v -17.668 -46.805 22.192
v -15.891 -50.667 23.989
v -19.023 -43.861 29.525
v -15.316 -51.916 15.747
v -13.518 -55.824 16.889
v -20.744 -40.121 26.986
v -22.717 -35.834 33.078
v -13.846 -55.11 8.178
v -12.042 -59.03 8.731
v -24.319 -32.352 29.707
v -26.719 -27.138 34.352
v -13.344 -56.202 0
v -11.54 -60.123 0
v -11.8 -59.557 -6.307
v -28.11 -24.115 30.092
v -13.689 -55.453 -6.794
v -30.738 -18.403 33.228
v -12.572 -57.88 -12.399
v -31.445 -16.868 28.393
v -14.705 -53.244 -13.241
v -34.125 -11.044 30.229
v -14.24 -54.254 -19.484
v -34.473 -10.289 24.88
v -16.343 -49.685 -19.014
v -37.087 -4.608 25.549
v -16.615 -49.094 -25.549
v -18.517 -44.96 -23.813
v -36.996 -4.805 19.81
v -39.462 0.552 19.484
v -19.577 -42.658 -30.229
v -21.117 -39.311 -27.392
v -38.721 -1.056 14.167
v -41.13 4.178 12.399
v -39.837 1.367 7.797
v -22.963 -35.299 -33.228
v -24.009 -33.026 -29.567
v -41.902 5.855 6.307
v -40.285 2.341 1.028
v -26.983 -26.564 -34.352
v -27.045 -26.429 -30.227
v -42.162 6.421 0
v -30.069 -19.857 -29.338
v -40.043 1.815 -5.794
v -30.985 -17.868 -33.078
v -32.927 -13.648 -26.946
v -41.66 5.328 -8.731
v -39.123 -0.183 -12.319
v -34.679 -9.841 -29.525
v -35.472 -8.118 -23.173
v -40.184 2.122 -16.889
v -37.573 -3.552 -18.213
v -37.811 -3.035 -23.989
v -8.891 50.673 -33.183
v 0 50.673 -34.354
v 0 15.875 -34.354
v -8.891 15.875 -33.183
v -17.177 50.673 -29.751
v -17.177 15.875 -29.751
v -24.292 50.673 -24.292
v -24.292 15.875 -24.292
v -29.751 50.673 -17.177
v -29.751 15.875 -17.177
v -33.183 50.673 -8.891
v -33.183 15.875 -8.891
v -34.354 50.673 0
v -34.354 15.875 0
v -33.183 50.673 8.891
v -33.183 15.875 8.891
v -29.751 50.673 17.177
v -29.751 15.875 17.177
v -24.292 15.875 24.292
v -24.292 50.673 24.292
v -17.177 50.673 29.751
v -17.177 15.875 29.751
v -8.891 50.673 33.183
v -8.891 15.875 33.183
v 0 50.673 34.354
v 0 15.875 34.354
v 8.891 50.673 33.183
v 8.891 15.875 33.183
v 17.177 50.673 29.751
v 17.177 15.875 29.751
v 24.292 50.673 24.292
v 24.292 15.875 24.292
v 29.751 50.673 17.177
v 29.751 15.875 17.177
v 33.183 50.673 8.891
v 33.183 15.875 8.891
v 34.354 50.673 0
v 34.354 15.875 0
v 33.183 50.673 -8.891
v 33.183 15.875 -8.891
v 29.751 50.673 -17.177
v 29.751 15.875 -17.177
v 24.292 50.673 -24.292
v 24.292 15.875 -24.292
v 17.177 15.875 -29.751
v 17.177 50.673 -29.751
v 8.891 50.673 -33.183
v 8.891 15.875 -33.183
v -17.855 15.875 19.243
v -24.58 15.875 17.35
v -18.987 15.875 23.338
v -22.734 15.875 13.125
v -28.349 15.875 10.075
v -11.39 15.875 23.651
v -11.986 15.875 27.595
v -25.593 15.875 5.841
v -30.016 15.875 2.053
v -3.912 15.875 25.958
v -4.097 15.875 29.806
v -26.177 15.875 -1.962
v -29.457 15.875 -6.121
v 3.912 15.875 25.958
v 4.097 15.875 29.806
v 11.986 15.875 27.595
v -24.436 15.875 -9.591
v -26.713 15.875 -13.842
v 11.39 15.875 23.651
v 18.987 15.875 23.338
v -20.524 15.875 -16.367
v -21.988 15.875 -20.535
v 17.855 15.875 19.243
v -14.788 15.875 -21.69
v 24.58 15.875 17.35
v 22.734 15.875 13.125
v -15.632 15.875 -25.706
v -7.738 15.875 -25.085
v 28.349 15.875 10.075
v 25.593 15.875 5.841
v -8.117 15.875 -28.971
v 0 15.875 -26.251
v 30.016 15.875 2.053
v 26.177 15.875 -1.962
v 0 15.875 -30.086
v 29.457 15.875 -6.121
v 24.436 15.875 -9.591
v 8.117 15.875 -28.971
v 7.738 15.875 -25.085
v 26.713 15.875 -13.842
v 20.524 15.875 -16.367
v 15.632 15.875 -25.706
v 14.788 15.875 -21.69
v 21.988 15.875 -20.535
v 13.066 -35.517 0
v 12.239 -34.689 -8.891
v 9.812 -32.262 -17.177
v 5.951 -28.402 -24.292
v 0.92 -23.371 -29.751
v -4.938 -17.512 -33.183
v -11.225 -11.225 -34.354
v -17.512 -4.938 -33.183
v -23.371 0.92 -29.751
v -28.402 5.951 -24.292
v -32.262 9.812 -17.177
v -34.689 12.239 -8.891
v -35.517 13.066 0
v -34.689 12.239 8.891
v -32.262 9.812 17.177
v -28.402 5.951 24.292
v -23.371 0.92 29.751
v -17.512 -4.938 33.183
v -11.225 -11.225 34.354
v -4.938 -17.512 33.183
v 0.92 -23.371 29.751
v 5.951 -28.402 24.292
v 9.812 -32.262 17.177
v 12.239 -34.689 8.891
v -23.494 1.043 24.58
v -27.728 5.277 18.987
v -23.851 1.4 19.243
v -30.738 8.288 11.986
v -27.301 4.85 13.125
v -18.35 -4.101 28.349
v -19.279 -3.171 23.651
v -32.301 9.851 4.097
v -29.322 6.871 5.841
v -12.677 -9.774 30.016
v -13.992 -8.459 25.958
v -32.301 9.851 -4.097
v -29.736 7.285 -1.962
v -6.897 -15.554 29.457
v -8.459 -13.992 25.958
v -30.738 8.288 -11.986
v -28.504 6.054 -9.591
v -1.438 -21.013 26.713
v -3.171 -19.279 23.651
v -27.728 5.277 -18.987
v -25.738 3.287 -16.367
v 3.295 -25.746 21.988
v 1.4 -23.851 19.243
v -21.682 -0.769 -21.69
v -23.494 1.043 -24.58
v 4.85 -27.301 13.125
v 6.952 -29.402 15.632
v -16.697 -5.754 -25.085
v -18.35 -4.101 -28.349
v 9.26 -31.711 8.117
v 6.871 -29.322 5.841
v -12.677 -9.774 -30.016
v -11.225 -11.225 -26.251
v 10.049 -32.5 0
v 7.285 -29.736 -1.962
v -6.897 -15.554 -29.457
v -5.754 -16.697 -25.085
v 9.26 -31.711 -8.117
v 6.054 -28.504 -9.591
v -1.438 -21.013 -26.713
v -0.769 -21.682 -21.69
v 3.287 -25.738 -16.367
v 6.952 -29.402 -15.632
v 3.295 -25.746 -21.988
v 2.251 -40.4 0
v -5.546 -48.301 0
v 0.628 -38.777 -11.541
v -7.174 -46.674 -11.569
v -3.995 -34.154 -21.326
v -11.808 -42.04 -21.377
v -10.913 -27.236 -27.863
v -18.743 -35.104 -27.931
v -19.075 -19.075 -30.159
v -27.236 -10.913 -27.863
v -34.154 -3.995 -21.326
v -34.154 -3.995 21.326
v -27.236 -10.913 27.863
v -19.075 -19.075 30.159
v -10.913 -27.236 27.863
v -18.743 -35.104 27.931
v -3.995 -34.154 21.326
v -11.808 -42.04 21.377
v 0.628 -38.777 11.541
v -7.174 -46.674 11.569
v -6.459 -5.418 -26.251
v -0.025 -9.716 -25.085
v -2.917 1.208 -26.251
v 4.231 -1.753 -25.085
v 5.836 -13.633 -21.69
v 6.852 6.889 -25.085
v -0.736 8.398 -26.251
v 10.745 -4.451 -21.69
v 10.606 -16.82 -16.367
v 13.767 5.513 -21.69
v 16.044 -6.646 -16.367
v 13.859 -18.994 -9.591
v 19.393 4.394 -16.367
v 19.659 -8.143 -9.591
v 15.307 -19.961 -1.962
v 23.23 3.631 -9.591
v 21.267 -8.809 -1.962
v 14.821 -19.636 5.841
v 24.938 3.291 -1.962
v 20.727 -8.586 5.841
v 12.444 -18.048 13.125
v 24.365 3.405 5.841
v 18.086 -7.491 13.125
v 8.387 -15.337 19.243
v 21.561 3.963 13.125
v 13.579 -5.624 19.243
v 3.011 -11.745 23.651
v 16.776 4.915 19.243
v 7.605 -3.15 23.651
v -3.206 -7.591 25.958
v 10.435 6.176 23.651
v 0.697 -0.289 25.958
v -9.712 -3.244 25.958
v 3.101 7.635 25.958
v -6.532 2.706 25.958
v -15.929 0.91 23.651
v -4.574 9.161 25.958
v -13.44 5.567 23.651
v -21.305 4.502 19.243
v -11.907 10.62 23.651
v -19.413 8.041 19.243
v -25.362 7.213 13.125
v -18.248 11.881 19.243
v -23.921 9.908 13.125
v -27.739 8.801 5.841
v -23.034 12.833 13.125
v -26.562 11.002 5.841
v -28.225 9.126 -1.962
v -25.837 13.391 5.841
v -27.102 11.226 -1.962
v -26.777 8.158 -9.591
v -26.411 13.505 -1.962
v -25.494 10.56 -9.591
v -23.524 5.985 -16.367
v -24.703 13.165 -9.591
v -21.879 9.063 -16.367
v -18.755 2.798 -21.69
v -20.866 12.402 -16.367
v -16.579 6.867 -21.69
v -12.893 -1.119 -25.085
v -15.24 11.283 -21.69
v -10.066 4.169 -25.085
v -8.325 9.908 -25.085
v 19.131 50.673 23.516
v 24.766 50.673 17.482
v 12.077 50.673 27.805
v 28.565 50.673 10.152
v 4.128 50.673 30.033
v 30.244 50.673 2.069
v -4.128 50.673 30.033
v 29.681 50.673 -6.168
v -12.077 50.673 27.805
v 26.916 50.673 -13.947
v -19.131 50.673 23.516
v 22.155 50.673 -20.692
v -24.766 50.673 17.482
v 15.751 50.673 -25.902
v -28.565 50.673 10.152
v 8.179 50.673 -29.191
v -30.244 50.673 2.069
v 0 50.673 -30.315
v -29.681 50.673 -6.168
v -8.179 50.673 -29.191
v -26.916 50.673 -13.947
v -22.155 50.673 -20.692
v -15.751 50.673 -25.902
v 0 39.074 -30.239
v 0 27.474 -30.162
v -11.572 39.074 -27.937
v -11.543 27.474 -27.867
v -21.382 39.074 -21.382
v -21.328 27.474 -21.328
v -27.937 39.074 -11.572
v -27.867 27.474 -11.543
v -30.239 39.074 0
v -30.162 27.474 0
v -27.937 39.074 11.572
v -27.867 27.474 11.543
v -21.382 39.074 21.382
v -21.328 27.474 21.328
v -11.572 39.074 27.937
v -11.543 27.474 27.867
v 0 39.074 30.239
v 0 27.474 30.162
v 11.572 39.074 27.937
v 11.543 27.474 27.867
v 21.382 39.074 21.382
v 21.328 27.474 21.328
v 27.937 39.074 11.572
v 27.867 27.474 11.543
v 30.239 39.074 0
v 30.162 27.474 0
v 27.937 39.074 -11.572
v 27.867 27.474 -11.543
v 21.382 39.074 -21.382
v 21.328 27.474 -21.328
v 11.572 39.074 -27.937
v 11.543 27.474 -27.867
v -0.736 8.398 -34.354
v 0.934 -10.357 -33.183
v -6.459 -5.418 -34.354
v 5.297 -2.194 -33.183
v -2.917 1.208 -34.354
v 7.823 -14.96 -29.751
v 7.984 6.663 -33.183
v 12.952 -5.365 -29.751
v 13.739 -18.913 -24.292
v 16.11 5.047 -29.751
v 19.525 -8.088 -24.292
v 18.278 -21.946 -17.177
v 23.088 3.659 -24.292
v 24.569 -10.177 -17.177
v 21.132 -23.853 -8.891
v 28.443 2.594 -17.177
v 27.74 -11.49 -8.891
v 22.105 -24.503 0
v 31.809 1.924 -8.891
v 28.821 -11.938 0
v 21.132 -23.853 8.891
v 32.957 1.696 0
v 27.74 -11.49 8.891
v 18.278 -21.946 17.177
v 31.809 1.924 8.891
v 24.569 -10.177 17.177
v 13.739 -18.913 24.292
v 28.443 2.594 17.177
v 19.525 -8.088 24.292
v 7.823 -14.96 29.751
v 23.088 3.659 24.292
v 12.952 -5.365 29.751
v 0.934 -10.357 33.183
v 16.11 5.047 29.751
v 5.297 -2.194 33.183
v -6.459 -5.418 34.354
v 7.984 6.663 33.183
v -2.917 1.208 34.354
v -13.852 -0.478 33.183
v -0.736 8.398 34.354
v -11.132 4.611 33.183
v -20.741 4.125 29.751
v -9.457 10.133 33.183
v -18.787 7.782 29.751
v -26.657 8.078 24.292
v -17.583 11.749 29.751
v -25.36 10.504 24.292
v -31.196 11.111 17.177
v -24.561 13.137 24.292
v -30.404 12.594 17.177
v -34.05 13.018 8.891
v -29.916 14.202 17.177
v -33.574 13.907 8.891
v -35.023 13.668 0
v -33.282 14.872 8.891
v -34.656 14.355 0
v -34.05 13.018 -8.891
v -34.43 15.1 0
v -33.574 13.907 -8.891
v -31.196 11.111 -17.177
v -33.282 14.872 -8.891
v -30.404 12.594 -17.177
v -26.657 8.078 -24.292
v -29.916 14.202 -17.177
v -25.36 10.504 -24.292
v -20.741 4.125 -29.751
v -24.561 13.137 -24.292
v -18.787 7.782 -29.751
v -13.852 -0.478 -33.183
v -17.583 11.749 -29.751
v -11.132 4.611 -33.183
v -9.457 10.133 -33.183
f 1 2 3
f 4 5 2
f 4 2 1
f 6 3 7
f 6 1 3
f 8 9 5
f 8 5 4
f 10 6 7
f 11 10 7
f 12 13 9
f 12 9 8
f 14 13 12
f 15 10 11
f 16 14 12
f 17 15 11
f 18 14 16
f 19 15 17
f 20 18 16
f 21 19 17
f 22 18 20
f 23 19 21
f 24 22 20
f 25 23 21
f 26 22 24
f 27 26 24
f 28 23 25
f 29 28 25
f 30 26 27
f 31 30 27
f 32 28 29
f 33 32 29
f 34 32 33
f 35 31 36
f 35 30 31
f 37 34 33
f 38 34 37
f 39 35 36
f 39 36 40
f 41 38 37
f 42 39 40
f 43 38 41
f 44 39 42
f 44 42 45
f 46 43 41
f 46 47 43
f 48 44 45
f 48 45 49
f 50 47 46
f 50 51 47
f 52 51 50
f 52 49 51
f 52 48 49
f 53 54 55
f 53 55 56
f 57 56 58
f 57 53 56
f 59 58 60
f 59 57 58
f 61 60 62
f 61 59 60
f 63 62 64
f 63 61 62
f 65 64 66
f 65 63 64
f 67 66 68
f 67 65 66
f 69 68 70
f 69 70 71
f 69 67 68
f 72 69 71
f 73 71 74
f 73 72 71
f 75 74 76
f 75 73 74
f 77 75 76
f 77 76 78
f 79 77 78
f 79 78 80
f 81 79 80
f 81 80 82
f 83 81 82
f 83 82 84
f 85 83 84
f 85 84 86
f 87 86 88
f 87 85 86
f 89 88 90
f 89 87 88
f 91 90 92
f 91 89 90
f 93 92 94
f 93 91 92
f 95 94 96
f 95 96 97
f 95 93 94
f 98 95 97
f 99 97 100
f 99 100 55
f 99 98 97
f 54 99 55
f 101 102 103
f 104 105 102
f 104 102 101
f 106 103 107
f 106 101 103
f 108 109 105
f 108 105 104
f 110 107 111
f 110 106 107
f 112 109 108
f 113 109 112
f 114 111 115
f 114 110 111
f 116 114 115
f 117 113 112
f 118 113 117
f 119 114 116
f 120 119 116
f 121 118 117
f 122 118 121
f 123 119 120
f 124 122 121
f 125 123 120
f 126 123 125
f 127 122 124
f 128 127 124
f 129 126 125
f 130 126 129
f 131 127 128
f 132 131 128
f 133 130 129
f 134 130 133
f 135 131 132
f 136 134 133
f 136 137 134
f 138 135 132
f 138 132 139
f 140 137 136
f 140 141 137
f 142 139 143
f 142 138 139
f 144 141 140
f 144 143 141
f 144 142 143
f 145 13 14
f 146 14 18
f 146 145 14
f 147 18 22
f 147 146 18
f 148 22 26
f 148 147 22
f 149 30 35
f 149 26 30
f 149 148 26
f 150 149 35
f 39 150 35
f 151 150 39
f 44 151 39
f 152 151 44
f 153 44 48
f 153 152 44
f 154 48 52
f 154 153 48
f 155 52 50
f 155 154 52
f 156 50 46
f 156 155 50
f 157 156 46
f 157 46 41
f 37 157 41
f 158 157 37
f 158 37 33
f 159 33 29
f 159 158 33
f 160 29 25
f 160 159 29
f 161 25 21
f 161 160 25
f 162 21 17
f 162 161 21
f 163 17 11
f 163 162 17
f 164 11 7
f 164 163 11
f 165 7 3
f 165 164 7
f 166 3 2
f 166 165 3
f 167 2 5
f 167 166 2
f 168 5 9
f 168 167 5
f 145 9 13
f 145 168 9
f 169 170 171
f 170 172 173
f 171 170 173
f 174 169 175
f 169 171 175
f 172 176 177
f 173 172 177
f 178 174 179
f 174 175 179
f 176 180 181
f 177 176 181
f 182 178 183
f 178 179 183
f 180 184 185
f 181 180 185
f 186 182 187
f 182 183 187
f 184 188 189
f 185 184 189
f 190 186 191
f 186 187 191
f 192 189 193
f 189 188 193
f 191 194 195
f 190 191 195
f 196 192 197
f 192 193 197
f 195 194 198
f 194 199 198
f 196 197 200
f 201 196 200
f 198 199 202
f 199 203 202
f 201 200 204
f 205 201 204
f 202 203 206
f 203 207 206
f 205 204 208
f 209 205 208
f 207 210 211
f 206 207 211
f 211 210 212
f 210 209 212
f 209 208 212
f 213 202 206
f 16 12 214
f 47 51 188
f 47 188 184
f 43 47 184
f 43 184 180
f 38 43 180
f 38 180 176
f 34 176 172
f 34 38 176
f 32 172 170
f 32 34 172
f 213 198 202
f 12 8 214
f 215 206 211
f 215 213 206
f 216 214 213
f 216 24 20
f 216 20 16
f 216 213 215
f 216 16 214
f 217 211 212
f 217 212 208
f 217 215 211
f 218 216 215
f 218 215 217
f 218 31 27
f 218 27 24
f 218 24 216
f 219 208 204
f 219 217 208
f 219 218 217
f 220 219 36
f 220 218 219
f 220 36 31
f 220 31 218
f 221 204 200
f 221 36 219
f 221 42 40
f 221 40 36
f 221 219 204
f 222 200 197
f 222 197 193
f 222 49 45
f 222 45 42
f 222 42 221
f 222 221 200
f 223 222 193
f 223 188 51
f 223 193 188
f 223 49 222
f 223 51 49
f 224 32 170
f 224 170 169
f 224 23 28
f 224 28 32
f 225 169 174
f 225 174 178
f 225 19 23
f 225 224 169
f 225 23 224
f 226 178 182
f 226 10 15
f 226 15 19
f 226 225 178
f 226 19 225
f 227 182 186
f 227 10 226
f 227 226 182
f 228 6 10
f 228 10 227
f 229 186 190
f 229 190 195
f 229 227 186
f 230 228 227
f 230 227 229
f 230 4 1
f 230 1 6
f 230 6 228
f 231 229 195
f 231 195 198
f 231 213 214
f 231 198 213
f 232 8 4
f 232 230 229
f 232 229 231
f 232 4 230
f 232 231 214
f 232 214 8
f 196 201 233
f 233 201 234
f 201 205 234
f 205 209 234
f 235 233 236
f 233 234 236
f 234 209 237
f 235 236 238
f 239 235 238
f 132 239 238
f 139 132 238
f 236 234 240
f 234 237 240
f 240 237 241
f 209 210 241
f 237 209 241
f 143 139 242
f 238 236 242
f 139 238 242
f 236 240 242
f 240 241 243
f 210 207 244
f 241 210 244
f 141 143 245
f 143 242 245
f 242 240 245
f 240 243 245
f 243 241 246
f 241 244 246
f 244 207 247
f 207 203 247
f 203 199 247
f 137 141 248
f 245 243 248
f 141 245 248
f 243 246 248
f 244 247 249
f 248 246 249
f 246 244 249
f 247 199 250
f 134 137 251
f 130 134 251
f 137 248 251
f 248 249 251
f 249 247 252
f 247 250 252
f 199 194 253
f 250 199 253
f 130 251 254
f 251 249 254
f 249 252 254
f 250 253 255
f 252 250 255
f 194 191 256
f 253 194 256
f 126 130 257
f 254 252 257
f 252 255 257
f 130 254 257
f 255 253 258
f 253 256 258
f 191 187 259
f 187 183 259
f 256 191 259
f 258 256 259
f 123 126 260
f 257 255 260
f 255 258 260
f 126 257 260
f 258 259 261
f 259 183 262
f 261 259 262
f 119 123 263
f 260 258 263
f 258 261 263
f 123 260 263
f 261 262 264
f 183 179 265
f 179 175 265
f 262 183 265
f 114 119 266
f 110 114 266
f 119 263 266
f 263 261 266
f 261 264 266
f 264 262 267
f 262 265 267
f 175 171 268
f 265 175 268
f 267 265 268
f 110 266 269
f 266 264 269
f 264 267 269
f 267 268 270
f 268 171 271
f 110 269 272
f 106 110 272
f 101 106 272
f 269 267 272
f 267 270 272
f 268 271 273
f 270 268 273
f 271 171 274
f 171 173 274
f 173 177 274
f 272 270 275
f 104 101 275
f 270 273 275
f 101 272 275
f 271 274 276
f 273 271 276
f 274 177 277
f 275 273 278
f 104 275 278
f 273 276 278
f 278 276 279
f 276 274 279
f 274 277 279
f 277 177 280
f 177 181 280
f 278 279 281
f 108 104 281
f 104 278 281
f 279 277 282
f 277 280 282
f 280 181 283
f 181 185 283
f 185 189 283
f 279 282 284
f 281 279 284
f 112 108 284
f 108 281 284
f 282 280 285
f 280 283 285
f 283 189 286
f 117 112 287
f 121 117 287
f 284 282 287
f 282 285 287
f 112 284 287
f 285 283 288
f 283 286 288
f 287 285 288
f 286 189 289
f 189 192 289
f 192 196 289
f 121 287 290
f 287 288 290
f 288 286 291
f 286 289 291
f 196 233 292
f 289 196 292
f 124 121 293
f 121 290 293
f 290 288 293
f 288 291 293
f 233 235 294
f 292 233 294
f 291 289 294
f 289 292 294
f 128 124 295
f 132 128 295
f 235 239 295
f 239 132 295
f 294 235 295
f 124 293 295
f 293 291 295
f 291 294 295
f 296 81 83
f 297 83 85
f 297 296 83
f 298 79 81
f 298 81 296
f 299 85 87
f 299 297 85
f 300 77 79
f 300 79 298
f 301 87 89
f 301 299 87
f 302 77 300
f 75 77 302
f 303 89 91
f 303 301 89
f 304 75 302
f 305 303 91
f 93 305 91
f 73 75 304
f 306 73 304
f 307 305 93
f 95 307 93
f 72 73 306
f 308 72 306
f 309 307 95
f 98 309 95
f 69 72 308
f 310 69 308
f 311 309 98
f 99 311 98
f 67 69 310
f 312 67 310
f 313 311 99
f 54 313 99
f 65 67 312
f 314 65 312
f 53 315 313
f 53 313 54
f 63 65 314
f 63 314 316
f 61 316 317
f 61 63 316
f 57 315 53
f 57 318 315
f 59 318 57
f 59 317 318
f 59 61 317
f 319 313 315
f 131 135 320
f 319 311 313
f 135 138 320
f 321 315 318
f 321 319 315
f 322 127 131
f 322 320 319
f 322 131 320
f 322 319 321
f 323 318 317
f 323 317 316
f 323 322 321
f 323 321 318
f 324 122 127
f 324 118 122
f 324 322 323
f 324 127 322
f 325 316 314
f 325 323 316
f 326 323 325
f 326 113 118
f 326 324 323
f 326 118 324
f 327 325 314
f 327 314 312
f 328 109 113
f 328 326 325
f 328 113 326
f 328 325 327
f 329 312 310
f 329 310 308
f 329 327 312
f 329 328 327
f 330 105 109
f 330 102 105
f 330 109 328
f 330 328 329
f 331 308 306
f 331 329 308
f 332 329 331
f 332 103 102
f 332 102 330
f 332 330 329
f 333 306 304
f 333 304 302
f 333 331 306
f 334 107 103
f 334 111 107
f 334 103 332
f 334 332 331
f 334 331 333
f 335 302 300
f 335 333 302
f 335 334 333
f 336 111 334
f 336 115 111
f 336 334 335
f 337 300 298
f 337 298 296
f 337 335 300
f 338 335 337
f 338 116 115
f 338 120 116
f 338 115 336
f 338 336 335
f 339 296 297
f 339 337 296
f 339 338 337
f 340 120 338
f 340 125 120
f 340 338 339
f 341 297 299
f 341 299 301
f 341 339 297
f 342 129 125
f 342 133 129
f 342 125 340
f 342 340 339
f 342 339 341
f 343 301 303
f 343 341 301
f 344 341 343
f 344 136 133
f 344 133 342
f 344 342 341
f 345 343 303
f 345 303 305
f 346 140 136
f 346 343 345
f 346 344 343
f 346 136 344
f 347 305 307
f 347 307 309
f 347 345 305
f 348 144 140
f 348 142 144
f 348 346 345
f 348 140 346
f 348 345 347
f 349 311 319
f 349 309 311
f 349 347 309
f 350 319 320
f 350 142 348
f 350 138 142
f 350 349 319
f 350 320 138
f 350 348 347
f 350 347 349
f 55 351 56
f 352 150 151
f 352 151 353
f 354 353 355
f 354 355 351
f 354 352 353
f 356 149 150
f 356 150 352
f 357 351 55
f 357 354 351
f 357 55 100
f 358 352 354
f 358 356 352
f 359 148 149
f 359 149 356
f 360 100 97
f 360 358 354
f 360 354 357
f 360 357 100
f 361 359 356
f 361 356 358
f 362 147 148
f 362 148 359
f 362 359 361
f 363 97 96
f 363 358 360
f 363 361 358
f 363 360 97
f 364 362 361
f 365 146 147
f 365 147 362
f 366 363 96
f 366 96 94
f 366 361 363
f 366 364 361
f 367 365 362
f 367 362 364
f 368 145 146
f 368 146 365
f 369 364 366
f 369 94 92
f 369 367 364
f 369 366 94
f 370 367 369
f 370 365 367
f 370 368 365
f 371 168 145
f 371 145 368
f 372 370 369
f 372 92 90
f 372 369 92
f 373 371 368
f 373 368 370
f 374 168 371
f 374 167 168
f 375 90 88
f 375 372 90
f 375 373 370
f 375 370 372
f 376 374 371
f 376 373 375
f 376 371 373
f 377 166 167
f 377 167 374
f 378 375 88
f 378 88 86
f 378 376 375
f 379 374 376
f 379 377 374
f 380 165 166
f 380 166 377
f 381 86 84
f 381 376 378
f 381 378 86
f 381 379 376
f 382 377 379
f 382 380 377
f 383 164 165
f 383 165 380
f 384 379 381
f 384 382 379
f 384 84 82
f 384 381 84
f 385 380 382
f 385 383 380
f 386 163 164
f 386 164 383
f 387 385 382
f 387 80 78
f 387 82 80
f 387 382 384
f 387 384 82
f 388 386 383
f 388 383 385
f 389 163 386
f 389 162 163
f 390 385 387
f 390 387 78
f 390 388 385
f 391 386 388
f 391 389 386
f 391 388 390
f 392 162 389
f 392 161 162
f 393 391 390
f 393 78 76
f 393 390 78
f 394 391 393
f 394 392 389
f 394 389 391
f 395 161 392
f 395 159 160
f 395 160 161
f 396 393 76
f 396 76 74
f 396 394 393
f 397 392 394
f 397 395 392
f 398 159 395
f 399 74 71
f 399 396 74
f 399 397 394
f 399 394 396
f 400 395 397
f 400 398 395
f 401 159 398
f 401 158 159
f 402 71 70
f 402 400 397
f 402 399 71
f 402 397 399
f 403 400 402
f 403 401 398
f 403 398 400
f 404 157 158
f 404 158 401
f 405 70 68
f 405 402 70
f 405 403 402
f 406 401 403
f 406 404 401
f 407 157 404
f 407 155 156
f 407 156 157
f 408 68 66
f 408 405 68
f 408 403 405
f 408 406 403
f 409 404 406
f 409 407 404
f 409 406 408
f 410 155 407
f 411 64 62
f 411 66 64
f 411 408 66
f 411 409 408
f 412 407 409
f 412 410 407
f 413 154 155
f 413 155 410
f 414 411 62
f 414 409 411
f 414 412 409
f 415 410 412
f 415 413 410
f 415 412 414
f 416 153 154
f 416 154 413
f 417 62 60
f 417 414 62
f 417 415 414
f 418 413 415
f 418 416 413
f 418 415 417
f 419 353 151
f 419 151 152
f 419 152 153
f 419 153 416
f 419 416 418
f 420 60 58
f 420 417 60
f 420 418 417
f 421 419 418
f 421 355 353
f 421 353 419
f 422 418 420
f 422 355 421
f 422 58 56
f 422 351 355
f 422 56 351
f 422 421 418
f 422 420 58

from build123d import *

# Parameters (mm, degrees)
SKETCH3_R               = 34.3535
SKETCH3_R_2             = 26.2509
CUT_EXTRUDE1_DEPTH      = 92.704245656
CUT_EXTRUDE1_DEPTH_BACK = 92.704245656


with BuildPart() as part:
    # Sketch1 → Revolve1 (revolve)
    with BuildSketch(Plane.XY):
        Polygon((-11.539629116, -60.122814731), (13.066272656, -35.516912959), (10.048906599, -32.499546902), (-14.395350562, -57.267093284), align=None)
    revolve(axis=Axis((-35.831221923, -35.831221923, 0), (0.7071067811865488, 0.7071067811865464, 0)))



with BuildPart() as body_2:
    # Sketch2 → Revolve2 (revolve)
    with BuildSketch(Plane.XY, mode=Mode.PRIVATE) as revolve2_sk:
        Polygon((30.3149, 50.673), (30.0863, 15.875), (34.3535, 15.875), (34.3535, 50.673), align=None)
    revolve(revolve2_sk.sketch.rotate(Axis((0, 0, 0), (0, 1, 0)), 90), axis=Axis((0, 0, 0), (0, 1, 0)))


with BuildPart() as part_1:
    add(part.part)

    add(body_2.part)  # Sweep1 merges body 2
    # Sweep1: sweep along a path in Sketch4
    with BuildLine(Plane.XY) as sweep1_path:
        ThreePointArc((-11.225320151, -11.225320151), (-2.917365657, 1.208412421), (0, 15.875))
    # Sketch3 → Sweep1 (sweep)
    with BuildSketch(Plane(origin=(-11.225320151, -11.225320151, 0), x_dir=(0, 0, -1), z_dir=(0.7071067811865486, 0.7071067811865465, 0))):
        Circle(SKETCH3_R)
        Circle(SKETCH3_R_2, mode=Mode.SUBTRACT)
    sweep(path=sweep1_path.line)

    # Sketch5 → Cut-Extrude1 (cut, two sides: drawn at the far end of the back side and taken through both)
    with BuildSketch(Plane.XY.offset(-CUT_EXTRUDE1_DEPTH_BACK)):
        Polygon((-42.162302488, 6.420883127), (-60.122814731, -11.539629116), (-11.539629116, -60.122814731), align=None)
    extrude(amount=CUT_EXTRUDE1_DEPTH + CUT_EXTRUDE1_DEPTH_BACK, mode=Mode.SUBTRACT)


solid = part_1.part
